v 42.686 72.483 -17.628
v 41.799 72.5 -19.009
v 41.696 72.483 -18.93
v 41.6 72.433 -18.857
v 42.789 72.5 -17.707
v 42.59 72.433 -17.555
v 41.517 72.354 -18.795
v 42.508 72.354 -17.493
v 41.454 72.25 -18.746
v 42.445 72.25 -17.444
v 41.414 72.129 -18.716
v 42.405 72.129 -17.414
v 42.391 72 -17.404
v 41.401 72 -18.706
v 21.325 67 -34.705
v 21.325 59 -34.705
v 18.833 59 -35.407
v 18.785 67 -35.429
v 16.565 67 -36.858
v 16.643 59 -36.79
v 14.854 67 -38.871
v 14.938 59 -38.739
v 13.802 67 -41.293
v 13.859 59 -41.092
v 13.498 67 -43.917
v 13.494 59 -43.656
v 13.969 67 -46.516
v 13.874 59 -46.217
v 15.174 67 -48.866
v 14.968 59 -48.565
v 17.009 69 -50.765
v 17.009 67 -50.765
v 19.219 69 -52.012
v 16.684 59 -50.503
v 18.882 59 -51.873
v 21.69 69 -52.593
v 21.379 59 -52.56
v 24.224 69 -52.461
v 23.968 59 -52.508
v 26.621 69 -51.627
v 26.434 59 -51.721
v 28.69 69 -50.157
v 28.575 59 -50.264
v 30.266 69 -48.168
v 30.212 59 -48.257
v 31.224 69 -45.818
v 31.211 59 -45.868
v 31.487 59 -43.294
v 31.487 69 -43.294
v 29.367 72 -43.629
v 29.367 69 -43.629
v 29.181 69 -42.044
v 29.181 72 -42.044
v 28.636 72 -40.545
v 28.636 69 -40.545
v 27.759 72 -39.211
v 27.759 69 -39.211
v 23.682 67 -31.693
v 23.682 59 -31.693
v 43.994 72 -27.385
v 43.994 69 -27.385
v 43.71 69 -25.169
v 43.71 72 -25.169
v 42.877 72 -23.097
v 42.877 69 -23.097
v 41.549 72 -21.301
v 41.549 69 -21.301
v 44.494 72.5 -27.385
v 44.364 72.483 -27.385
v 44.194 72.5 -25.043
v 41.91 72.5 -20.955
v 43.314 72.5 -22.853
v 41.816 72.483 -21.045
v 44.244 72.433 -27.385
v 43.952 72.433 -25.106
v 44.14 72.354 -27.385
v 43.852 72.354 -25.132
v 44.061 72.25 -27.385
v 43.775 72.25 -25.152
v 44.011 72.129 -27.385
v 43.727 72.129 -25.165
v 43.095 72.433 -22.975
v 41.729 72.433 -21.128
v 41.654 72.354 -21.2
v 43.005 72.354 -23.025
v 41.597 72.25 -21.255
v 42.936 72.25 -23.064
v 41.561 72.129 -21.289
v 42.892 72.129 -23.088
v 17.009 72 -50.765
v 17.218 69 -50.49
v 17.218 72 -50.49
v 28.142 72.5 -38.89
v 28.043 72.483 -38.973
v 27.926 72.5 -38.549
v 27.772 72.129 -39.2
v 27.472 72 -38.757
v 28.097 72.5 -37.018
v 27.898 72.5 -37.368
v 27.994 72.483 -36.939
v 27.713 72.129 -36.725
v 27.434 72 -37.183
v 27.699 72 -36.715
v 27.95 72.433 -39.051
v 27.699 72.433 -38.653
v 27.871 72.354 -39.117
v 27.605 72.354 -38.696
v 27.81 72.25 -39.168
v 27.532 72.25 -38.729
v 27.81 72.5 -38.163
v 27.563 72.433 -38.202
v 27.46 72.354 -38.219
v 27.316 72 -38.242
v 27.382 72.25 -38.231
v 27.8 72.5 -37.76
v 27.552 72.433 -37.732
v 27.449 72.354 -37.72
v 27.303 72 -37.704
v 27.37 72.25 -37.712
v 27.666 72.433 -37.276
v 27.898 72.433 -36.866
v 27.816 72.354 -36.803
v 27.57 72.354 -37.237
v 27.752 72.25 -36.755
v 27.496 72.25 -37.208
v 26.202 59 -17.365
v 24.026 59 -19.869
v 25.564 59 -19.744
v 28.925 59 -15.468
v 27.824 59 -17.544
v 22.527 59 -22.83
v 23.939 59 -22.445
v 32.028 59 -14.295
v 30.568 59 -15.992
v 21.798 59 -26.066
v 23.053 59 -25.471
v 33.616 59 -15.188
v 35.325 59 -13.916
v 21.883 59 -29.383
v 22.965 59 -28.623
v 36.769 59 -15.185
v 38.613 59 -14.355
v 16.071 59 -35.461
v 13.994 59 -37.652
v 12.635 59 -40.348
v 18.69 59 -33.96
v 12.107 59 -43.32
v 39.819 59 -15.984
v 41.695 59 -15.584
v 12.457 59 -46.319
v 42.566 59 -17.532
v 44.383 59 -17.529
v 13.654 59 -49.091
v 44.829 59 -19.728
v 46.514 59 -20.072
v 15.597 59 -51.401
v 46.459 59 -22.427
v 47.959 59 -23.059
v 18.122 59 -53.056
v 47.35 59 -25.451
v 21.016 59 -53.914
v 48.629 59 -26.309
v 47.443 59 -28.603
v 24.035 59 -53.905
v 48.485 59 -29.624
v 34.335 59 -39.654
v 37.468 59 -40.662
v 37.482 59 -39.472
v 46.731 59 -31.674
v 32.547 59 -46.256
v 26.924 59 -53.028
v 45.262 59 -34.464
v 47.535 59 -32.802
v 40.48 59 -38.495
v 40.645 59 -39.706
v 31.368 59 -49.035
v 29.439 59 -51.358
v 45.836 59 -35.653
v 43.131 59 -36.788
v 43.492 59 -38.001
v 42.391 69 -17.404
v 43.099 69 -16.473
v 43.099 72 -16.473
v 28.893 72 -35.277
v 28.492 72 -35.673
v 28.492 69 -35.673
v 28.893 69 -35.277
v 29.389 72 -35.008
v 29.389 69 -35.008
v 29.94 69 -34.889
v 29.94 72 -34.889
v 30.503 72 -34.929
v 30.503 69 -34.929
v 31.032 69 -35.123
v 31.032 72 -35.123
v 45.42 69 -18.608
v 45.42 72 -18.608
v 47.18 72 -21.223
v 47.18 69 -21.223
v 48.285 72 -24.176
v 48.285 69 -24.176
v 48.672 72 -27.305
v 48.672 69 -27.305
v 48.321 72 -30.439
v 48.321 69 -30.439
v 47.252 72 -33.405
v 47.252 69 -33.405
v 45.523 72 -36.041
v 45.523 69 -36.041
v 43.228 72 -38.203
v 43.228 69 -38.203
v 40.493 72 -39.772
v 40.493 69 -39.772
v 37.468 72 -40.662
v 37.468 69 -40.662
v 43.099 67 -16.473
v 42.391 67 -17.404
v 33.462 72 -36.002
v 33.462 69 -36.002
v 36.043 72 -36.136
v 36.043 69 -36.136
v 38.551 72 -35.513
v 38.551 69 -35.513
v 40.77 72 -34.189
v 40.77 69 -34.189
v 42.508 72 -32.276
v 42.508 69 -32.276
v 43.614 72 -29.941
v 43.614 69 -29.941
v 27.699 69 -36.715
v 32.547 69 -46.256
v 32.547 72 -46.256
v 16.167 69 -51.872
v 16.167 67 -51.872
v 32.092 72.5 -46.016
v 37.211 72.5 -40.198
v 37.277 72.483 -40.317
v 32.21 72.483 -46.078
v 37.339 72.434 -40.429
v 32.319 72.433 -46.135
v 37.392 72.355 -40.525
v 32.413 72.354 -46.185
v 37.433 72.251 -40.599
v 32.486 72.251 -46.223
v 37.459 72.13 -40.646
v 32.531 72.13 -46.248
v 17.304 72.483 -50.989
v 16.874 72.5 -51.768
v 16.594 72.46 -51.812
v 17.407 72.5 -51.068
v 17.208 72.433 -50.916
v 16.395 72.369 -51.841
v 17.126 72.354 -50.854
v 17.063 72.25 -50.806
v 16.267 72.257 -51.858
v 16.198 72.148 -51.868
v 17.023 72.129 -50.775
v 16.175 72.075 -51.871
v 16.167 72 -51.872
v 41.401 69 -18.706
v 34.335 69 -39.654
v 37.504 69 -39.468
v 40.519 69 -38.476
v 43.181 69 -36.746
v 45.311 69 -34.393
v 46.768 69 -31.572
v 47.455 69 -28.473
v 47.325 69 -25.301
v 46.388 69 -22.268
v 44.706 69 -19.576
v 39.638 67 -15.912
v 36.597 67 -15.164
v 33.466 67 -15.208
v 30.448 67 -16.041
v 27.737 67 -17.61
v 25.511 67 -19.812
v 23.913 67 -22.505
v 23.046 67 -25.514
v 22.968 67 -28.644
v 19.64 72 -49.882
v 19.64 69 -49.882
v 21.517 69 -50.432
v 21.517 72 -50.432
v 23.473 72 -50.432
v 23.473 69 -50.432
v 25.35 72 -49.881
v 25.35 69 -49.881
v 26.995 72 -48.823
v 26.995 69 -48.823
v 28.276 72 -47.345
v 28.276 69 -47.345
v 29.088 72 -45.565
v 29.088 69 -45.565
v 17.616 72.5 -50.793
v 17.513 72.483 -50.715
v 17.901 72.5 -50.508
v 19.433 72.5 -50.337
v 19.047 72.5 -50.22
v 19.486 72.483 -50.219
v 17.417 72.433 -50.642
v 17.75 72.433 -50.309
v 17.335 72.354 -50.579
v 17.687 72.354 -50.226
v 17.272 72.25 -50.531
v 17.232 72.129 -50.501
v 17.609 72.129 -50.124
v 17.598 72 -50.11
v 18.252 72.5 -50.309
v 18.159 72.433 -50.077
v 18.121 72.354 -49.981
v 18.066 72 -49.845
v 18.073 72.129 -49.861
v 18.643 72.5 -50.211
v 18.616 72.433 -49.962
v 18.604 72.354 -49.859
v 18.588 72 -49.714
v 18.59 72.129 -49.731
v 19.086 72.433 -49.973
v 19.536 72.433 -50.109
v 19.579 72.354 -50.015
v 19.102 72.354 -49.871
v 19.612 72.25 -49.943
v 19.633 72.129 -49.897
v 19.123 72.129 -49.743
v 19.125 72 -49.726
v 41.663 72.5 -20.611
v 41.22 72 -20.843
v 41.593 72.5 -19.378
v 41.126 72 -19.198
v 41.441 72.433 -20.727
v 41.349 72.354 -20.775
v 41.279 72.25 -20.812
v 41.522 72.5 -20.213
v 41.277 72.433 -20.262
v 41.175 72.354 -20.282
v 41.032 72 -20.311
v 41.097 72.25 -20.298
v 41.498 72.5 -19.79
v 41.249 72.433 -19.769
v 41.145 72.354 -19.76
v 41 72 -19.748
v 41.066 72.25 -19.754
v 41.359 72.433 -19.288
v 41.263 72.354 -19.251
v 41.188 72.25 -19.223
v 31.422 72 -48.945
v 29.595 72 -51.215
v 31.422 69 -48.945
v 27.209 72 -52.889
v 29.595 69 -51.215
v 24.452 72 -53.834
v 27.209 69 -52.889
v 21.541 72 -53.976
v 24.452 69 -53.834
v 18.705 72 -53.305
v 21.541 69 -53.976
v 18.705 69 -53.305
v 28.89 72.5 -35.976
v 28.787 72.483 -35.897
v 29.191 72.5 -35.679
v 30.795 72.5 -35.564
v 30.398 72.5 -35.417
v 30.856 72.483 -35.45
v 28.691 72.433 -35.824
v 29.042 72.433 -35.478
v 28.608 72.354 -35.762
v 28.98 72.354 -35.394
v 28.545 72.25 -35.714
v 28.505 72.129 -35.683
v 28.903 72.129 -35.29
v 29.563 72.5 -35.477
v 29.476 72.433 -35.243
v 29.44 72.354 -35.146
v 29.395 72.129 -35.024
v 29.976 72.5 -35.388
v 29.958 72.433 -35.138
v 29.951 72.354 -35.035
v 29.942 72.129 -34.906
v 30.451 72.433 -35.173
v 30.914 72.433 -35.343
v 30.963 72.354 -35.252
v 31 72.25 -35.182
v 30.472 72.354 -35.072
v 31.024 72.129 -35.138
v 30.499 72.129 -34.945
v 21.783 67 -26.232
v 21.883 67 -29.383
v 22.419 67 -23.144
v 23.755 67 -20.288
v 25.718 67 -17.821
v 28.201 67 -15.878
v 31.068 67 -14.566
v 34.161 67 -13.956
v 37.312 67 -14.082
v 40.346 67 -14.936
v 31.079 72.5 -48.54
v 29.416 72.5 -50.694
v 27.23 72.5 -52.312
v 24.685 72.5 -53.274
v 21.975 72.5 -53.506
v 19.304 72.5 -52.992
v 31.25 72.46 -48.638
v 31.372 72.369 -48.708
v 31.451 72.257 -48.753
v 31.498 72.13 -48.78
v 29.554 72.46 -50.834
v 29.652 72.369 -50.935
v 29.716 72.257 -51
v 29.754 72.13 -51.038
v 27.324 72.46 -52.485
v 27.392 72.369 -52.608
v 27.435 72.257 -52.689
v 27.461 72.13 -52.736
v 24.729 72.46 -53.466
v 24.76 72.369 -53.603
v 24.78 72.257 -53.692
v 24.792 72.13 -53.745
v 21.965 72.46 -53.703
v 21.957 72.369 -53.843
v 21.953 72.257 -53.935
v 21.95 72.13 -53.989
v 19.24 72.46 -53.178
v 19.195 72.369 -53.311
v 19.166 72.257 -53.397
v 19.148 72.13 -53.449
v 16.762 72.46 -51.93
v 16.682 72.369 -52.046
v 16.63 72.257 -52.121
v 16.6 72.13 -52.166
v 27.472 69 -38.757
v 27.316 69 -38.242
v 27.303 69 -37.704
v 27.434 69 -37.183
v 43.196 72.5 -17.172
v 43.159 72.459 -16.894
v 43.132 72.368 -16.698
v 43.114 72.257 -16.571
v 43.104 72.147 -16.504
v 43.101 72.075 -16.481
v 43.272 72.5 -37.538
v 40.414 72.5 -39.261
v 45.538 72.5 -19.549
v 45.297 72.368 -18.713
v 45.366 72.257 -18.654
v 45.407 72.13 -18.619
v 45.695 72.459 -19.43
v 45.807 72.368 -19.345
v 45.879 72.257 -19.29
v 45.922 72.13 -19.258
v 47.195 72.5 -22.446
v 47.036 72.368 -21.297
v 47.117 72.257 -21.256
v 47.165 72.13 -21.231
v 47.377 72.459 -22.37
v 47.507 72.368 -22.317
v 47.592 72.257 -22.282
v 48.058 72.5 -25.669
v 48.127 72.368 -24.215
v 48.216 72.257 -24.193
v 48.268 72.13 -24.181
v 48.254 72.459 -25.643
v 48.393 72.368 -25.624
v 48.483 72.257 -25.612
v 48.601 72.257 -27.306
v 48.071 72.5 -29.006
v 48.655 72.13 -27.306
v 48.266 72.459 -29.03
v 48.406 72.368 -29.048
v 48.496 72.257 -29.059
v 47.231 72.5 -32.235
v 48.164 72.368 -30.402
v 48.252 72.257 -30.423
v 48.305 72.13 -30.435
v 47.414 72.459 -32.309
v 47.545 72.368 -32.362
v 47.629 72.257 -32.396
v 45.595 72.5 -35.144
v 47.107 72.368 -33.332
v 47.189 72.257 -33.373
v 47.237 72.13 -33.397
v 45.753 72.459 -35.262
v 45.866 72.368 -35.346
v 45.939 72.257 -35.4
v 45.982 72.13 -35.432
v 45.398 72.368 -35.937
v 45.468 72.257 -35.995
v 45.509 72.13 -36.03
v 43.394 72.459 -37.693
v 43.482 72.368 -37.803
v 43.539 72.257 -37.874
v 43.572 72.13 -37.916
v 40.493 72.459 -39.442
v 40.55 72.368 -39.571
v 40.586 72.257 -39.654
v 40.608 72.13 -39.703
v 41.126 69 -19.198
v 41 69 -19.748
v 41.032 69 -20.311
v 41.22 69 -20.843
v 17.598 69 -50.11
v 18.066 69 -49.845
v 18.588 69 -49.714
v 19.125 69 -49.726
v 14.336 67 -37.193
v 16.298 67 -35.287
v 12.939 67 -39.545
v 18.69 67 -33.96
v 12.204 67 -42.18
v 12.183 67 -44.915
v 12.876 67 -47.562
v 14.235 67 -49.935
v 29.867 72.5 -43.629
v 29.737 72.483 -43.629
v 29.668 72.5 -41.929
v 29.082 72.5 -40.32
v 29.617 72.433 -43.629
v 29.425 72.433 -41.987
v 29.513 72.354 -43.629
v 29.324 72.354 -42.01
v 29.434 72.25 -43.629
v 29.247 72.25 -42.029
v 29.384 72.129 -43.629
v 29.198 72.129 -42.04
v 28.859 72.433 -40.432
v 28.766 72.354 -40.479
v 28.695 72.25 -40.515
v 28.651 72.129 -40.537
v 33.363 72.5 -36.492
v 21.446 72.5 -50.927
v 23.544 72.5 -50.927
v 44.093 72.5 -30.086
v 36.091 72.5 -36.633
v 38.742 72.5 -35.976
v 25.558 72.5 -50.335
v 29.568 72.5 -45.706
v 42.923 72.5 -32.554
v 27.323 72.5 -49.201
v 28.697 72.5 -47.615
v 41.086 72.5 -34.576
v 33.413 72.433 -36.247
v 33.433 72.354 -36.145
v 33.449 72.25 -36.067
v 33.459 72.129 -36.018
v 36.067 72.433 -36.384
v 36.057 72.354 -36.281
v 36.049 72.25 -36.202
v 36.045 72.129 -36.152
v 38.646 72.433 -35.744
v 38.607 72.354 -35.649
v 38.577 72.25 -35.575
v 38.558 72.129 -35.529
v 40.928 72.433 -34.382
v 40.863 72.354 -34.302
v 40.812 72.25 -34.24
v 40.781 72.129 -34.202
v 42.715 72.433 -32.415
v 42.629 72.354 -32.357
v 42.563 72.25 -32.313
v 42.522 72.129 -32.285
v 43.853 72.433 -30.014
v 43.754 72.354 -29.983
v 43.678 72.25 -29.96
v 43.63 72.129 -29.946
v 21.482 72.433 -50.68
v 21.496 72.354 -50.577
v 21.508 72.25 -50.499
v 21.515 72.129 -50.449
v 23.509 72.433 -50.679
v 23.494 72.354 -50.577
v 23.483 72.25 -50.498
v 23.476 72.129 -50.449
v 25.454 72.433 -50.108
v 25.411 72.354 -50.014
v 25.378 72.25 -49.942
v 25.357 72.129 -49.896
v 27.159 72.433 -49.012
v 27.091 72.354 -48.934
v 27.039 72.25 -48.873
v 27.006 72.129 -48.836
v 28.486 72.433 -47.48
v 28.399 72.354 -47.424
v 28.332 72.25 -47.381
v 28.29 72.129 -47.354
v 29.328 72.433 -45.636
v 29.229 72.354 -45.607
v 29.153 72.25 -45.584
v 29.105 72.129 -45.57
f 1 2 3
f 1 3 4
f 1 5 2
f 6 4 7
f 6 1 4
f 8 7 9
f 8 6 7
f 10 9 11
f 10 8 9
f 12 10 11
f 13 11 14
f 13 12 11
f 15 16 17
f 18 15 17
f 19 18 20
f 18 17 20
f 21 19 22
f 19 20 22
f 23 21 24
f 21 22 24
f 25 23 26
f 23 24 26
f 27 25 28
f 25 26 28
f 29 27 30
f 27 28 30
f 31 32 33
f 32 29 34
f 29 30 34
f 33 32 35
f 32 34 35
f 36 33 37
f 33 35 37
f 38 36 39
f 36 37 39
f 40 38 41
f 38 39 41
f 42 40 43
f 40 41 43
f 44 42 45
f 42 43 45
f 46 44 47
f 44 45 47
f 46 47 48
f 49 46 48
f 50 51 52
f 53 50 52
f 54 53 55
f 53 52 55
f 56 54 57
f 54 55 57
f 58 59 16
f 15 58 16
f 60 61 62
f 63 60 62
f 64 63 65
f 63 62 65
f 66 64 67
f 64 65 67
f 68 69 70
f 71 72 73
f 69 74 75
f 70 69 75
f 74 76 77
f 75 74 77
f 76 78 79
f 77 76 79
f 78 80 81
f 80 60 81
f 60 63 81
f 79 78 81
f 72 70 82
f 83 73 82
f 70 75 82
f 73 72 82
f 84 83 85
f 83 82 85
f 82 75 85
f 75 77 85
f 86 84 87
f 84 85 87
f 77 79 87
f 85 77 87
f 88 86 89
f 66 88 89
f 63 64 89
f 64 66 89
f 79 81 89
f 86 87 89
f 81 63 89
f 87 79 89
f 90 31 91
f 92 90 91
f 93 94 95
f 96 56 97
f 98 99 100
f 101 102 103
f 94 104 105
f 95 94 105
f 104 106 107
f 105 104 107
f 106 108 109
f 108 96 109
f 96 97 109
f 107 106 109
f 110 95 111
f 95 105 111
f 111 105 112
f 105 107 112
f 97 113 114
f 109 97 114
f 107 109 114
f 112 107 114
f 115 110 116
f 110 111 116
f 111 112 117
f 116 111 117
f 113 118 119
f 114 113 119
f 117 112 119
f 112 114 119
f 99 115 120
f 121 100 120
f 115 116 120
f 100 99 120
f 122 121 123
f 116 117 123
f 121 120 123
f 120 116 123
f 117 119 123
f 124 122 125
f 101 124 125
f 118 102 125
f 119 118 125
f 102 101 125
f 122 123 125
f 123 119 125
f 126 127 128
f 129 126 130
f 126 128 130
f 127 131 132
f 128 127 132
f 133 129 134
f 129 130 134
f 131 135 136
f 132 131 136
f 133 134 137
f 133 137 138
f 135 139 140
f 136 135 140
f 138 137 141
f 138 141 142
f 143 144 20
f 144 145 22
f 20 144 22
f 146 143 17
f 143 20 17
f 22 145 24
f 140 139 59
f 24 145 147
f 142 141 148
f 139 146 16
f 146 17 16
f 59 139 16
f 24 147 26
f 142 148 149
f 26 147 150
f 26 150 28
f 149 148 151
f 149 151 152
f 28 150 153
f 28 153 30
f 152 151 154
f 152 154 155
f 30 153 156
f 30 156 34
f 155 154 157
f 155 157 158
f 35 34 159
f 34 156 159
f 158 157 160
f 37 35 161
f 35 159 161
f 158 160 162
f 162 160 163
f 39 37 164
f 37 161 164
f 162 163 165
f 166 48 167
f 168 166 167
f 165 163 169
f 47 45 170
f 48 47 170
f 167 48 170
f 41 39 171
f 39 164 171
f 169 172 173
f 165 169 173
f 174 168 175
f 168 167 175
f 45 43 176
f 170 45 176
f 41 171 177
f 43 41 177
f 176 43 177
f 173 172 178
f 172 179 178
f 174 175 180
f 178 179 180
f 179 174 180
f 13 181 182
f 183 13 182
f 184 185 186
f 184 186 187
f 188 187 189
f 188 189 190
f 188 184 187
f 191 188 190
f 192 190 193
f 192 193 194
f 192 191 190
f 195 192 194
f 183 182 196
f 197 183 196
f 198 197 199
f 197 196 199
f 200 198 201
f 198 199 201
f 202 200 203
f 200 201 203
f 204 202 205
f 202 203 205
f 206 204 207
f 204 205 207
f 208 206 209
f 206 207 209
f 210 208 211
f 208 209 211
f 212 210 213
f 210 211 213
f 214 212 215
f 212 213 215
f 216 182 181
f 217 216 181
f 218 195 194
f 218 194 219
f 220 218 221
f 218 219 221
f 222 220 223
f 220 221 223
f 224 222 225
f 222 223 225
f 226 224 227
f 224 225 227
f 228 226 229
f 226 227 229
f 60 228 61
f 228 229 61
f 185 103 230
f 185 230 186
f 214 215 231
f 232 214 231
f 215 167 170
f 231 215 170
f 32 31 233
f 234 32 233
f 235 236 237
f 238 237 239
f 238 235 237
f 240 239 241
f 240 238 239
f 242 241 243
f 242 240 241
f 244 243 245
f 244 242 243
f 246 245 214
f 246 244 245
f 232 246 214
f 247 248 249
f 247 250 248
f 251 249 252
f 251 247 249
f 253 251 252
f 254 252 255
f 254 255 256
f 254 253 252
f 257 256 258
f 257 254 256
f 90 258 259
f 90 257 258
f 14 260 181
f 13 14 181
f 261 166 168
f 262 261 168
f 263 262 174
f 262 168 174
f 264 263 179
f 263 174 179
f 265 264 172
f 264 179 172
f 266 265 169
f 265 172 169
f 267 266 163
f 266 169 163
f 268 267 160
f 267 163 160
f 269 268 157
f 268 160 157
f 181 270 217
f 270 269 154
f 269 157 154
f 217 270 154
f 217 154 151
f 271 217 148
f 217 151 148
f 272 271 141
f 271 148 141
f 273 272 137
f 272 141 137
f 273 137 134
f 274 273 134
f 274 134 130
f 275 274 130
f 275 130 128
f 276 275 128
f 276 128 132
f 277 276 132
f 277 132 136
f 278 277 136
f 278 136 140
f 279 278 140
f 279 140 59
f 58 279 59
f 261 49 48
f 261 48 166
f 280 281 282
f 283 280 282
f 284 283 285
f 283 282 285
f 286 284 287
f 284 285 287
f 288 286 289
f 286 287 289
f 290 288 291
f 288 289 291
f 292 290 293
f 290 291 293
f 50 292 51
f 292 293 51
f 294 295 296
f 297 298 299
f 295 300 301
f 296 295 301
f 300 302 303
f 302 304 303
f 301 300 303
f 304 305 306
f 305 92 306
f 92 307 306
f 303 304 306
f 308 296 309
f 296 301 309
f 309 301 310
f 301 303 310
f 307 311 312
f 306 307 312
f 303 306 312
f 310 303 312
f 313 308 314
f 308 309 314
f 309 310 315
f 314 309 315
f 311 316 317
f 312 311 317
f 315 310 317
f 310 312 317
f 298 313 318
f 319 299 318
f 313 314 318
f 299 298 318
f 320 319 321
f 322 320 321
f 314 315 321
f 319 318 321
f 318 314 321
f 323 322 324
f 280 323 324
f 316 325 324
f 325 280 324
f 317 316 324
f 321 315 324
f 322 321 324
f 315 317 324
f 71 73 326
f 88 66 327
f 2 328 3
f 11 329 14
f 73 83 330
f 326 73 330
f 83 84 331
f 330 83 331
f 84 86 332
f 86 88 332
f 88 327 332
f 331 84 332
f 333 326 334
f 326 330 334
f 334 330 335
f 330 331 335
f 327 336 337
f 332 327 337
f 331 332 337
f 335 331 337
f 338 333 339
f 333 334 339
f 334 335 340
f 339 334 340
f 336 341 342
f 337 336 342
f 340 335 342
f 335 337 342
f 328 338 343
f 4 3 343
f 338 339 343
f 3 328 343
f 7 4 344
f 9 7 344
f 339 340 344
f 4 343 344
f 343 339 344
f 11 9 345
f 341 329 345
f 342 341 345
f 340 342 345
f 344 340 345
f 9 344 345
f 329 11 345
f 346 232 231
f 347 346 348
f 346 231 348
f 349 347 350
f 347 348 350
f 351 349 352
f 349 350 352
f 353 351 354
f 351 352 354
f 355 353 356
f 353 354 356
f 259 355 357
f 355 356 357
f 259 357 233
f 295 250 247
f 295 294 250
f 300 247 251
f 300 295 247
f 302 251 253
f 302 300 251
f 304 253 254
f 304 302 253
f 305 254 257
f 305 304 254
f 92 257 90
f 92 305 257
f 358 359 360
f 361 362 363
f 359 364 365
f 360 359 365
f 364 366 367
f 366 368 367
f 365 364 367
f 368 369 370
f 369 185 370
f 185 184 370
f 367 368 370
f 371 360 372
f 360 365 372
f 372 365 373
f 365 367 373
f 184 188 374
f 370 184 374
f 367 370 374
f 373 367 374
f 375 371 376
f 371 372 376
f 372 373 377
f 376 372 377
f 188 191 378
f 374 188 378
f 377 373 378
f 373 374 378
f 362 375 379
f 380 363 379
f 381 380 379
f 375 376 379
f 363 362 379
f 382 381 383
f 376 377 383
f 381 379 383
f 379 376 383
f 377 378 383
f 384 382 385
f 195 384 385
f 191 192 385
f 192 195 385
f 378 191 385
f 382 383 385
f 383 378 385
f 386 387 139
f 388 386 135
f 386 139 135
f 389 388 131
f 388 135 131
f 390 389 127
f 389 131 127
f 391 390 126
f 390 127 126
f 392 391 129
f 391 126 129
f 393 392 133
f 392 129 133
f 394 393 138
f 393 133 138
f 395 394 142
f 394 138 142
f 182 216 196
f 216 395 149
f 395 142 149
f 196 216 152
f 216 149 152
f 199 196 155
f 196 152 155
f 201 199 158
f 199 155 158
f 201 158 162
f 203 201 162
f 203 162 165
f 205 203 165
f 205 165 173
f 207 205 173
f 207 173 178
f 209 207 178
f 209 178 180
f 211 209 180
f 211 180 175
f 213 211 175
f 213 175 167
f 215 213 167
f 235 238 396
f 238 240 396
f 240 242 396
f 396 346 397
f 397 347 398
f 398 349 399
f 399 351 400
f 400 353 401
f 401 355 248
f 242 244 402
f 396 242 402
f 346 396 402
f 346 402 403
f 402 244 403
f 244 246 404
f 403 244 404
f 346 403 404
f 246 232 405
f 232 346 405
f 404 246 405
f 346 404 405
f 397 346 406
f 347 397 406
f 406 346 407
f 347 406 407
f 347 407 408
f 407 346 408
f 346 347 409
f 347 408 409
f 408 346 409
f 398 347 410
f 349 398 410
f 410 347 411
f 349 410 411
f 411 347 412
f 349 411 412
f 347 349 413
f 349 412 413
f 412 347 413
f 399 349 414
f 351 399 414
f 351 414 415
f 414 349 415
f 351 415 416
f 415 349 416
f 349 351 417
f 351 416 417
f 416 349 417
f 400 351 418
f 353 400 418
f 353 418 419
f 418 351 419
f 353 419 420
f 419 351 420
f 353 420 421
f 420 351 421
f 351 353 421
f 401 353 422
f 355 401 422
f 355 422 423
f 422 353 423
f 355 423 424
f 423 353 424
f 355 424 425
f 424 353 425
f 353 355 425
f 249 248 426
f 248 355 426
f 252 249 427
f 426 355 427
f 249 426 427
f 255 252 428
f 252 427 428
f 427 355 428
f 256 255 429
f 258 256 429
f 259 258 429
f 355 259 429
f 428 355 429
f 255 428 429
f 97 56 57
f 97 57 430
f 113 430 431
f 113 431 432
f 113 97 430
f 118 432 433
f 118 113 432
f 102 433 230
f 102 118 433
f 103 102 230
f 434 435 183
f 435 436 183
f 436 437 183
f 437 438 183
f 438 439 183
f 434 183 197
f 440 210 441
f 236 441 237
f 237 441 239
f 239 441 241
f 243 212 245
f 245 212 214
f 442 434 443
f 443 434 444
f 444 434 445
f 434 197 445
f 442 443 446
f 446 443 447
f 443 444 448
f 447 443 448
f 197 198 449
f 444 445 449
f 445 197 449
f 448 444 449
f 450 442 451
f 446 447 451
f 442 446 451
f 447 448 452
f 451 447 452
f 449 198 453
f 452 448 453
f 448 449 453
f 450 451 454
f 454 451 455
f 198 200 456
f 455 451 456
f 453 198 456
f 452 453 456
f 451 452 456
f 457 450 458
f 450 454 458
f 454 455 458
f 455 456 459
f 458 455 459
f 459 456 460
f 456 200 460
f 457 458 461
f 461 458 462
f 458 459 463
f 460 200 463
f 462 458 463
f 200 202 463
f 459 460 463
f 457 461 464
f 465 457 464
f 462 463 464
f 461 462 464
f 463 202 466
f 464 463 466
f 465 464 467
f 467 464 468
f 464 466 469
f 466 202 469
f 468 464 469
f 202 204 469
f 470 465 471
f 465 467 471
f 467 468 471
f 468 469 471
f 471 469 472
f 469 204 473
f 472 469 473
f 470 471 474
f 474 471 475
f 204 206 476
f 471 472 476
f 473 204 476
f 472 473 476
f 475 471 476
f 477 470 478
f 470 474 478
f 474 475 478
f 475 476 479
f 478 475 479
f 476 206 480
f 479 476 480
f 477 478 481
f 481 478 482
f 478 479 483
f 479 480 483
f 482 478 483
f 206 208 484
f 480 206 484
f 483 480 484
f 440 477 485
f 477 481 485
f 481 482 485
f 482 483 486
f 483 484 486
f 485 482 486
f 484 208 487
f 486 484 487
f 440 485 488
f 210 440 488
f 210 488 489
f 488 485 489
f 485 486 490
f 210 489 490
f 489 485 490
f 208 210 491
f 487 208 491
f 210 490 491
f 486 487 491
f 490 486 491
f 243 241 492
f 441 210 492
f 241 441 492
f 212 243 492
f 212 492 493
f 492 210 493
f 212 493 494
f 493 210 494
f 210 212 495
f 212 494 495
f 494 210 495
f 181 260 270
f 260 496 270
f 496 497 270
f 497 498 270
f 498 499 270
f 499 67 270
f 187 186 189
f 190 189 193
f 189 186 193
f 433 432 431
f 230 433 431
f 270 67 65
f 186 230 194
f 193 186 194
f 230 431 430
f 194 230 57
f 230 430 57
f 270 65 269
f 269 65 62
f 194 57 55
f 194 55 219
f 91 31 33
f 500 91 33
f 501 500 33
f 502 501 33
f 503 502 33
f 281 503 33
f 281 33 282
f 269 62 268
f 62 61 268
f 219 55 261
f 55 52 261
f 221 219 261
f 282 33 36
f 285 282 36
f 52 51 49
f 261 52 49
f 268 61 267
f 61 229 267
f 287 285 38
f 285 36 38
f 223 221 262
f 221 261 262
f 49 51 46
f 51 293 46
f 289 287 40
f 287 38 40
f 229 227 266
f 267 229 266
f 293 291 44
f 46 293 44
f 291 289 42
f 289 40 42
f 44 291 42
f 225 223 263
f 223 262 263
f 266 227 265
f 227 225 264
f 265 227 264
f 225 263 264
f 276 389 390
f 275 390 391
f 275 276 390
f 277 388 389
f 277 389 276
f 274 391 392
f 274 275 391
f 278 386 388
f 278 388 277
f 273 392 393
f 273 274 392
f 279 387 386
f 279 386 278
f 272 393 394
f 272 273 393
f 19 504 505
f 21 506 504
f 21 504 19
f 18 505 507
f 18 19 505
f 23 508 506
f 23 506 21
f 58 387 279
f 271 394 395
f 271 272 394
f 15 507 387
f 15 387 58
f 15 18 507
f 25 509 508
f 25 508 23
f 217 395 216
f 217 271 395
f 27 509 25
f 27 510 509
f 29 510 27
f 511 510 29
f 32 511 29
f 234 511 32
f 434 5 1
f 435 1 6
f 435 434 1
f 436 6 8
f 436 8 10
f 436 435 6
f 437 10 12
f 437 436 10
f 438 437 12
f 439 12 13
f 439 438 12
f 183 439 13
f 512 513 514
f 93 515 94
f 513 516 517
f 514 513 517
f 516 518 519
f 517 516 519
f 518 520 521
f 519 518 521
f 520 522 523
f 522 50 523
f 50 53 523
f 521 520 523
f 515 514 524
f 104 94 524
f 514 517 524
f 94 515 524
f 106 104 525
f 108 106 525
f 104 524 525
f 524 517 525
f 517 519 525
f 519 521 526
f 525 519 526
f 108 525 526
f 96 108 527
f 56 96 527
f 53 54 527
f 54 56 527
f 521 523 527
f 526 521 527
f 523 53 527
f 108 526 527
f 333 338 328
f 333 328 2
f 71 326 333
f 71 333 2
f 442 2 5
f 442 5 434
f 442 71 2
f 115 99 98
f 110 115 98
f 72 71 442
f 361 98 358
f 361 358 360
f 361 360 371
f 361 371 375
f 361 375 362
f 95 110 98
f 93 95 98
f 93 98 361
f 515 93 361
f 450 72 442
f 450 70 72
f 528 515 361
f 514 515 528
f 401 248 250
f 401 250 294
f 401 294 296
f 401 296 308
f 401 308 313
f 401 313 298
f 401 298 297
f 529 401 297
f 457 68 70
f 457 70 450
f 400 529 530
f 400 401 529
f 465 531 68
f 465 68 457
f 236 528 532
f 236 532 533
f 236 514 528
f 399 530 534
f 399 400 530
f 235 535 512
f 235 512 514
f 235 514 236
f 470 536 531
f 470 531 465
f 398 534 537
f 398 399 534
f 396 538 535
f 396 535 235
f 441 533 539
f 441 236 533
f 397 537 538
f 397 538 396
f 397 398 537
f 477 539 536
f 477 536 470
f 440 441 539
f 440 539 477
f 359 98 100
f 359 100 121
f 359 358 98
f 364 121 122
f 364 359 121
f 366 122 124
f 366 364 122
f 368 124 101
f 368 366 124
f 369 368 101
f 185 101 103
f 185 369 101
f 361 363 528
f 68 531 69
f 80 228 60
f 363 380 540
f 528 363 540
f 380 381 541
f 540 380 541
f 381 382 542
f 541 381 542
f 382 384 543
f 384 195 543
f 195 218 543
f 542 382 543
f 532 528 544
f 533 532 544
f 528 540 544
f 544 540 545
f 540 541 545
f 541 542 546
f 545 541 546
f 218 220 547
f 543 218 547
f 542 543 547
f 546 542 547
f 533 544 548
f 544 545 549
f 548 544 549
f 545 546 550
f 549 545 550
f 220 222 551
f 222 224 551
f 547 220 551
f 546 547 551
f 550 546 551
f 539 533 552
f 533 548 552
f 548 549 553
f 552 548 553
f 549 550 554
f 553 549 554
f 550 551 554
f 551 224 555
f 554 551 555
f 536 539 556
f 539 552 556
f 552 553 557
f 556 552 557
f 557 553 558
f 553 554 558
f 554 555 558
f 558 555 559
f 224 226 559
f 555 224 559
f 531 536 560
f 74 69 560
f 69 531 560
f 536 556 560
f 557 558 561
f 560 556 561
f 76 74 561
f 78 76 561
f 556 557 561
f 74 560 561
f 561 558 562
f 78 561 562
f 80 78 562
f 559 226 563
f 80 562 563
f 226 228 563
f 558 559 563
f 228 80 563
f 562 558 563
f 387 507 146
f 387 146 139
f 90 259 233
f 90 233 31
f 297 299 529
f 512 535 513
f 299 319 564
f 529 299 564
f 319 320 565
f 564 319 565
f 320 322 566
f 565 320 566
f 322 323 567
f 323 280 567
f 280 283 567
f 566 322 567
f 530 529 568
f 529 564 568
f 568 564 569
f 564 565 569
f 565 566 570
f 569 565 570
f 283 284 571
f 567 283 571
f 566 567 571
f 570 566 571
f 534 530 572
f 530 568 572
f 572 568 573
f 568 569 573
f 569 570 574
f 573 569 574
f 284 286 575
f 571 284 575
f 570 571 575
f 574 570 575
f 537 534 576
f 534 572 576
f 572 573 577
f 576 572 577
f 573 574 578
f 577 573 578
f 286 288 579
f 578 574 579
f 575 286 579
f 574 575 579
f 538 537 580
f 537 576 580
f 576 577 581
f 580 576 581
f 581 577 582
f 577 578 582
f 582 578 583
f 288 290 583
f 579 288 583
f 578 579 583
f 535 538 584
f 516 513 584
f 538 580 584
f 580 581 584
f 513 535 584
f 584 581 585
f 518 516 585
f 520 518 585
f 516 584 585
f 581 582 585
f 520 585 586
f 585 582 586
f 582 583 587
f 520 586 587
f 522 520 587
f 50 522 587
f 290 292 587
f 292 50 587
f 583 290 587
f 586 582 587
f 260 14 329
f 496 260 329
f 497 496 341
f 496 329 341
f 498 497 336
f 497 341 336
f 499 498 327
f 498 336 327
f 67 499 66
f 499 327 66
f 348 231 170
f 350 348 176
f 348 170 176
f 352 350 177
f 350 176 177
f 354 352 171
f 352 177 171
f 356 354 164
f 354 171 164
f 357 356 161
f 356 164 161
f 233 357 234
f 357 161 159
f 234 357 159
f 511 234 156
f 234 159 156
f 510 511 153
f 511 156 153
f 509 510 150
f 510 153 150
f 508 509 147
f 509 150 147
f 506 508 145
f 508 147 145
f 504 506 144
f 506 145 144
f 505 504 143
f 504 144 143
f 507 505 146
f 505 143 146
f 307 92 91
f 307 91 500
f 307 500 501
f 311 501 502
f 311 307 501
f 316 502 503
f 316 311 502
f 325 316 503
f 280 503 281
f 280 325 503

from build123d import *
from build123d.topology import SkipClean

# Parameters (mm, degrees)
SKETCH1_R                      = 12.3
SKETCH1_R_2                    = 11.45
SKETCH1_R_3                    = 9
SKETCH1_R_4                    = 8.15
BOSS_EXTRUDE4_DEPTH            = 59
SKETCH1_8_R                    = 5
BOSS_EXTRUDE17_DEPTH           = 10
BOSS_EXTRUDE17_DRAFT           = 1
BOSS_EXTRUDE17_PROFILE_2_DEPTH = 10
BOSS_EXTRUDE17_PROFILE_2_DRAFT = 1
BOSS_EXTRUDE19_DEPTH           = 59
SKETCH17_R                     = 11.45
SKETCH17_R_2                   = 8.15
BOSS_EXTRUDE20_DEPTH           = 3
SKETCH19_R                     = 3.2
CUT_EXTRUDE5_DEPTH             = 10
BOSS_EXTRUDE21_DEPTH           = 10
CUT_EXTRUDE8_DEPTH             = 66
CUT_EXTRUDE9_DEPTH             = 2
BOSS_EXTRUDE24_DEPTH           = 3.5
FILLET1_R                      = 2
FILLET2_R                      = 0.5


with BuildPart() as part:
    # Sketch1 → Boss-Extrude4 (new body)
    # profile 1 of 2: a face of its own
    with BuildSketch(Plane(origin=(0, 0, 0), x_dir=(1, 0, 0), z_dir=(0, 1, 0))):
        with Locations((35.202950653, 27.384819692)):
            Circle(SKETCH1_R)
        with Locations(Location((35.202950653, 27.384819692, 0), (0, 0, 270))):
            Circle(SKETCH1_R_2, mode=Mode.SUBTRACT)
    # profile 2 of 2: a face of its own
    with BuildSketch(Plane(origin=(0, 0, 0), x_dir=(1, 0, 0), z_dir=(0, 1, 0))):
        with Locations((22.493671705, 43.629178782)):
            Circle(SKETCH1_R_3)
        with Locations(Location((22.493671705, 43.629178782, 0), (0, 0, 270))):
            Circle(SKETCH1_R_4, mode=Mode.SUBTRACT)
    extrude(amount=BOSS_EXTRUDE4_DEPTH)

    # Sketch12 → Boss-Extrude19 (add)
    with SkipClean():  # the faces are left unmerged after this step: merging them gives an invalid solid
        with BuildSketch(Plane(origin=(0, 0, 0), x_dir=(-1, 0, 0), z_dir=(0, -1, 0))):
            with BuildLine():
                Line((-34.977539895, 38.8326007), (-30.605091655, 44.421243424))
                ThreePointArc((-30.605091655, 44.421243424), (-27.821958355, 37.462181021), (-20.532623065, 35.718629608))
                Line((-20.532623065, 35.718629608), (-24.304935413, 30.897050301))
                ThreePointArc((-24.304935413, 30.897050301), (-28.370974986, 36.573215009), (-34.977539895, 38.8326007))
            make_face()
        extrude(amount=-BOSS_EXTRUDE19_DEPTH)



with BuildPart() as body_2:
    # Sketch1<8> → Boss-Extrude17 (with draft: the straight prism first)
    with BuildSketch(Plane(origin=(0, 0, 0), x_dir=(1, 0, 0), z_dir=(0, 1, 0))):
        with Locations((22.493671705, 43.629178782)):
            Circle(SKETCH1_8_R)
    extrude(amount=BOSS_EXTRUDE17_DEPTH)
    # Boss-Extrude17: the draft: its side faces are tilted about the plane it starts from
    boss_extrude17_sides = [body_2.faces().sort_by_distance(p)[0] for p in [
        (17.493671705, 5, -43.629178782),
    ]]
    draft(boss_extrude17_sides, Plane(origin=(0, 0, 0), x_dir=(1, 0, 0), z_dir=(0, 1, 0)), BOSS_EXTRUDE17_DRAFT)


with BuildPart() as body_3:
    # Sketch1<8> → Boss-Extrude17 profile 2 (with draft: the straight prism first)
    with BuildSketch(Plane(origin=(0, 0, 0), x_dir=(1, 0, 0), z_dir=(0, 1, 0))):
        with Locations((35.202950653, 27.384819692)):
            Circle(SKETCH1_8_R)
    extrude(amount=BOSS_EXTRUDE17_PROFILE_2_DEPTH)
    # Boss-Extrude17 profile 2: the draft: its side faces are tilted about the plane it starts from
    boss_extrude17_profile_2_sides = [body_3.faces().sort_by_distance(p)[0] for p in [
        (30.202950653, 5, -27.384819692),
    ]]
    draft(boss_extrude17_profile_2_sides, Plane(origin=(0, 0, 0), x_dir=(1, 0, 0), z_dir=(0, 1, 0)), BOSS_EXTRUDE17_PROFILE_2_DRAFT)


with BuildPart() as part_1:
    with SkipClean():  # the faces are left unmerged after this step: merging them gives an invalid solid
        add(part.part)

        add(body_2.part)  # Boss-Extrude20 merges body 2

        add(body_3.part)  # Boss-Extrude20 merges body 3
        # Sketch17 → Boss-Extrude20 (add)
        with BuildSketch(Plane.XZ):
            with Locations(Location((35.202950653, -27.384819692, 0), (0, 0, 270))):
                Circle(SKETCH17_R)
            with Locations(Location((22.493671705, -43.629178782, 0), (0, 0, 270))):
                Circle(SKETCH17_R_2)
        extrude(amount=-BOSS_EXTRUDE20_DEPTH)

    # Sketch19 → Cut-Extrude5 (cut)
    with SkipClean():  # the faces are left unmerged after this step: merging them gives an invalid solid
        with BuildSketch(Plane(origin=(0, 0, 0), x_dir=(-1, 0, 0), z_dir=(0, -1, 0))):
            with Locations(Location((-35.202950653, 27.384819692, 0), (0, 0, 90))):
                Circle(SKETCH19_R)
            with Locations(Location((-22.493671705, 43.629178782, 0), (0, 0, 90))):
                Circle(SKETCH19_R)
        extrude(amount=-CUT_EXTRUDE5_DEPTH, mode=Mode.SUBTRACT)

    # Sketch35 → Cut-Extrude8 (cut)
    with BuildSketch(Plane.XZ):
        with BuildLine():
            Line((21.325413706, -34.705324611), (23.682144413, -31.693070334))
            ThreePointArc((23.682144413, -31.693070334), (42.566125739, -17.532223454), (34.334781161, -39.654142483))
            Line((34.334781161, -39.654142483), (31.487409842, -43.293508835))
            ThreePointArc((31.487409842, -43.293508835), (16.684303244, -50.503132381), (21.325413706, -34.705324611))
        make_face()
    extrude(amount=-CUT_EXTRUDE8_DEPTH, mode=Mode.SUBTRACT)


with BuildPart() as body_2_2:
    # Sketch23 → Boss-Extrude21 (new body)
    with BuildSketch(Plane(origin=(0, 59, 0), x_dir=(1, 0, 0), z_dir=(0, 1, 0))):
        with BuildLine():
            Line((37.468337272, 40.662183298), (32.546981676, 46.25595936))
            ThreePointArc((32.546981676, 46.25595936), (15.596937819, 51.401184911), (18.690039782, 33.959566495))
            Line((18.690039782, 33.959566495), (21.882803933, 29.3833322))
            ThreePointArc((21.882803933, 29.3833322), (43.099472085, 16.473114504), (37.468337272, 40.662183298))
        make_face()
        with BuildLine():
            ThreePointArc((21.325413706, 34.705324611), (16.684303244, 50.503132381), (31.487409842, 43.293508835))
            Line((31.487409842, 43.293508835), (34.334781161, 39.654142483))
            ThreePointArc((34.334781161, 39.654142483), (42.566125739, 17.532223454), (23.682144413, 31.693070334))
            Line((23.682144413, 31.693070334), (21.325413706, 34.705324611))
        make_face(mode=Mode.SUBTRACT)
    extrude(amount=BOSS_EXTRUDE21_DEPTH)

    # Sketch36 → Cut-Extrude9 (cut)
    with BuildSketch(Plane(origin=(0, 69, 0), x_dir=(1, 0, 0), z_dir=(0, 1, 0))):
        with BuildLine():
            Line((43.099472085, 16.473114504), (16.167051125, 51.87192648))
            ThreePointArc((16.167051125, 51.87192648), (12.204421781, 42.179919116), (18.690039782, 33.959566495))
            Line((18.690039782, 33.959566495), (21.882803933, 29.3833322))
            ThreePointArc((21.882803933, 29.3833322), (28.201353831, 15.878386587), (43.099472085, 16.473114504))
        make_face()
    extrude(amount=-CUT_EXTRUDE9_DEPTH, mode=Mode.SUBTRACT)

    # Sketch37 → Boss-Extrude24 (add)
    with BuildSketch(Plane(origin=(0, 69, 0), x_dir=(1, 0, 0), z_dir=(0, 1, 0))):
        with BuildLine():
            ThreePointArc((34.334781161, 39.654142483), (46.768156488, 31.572422107), (42.391274941, 17.403938272))
            Line((42.391274941, 17.403938272), (43.099472085, 16.473114504))
            ThreePointArc((43.099472085, 16.473114504), (48.321405443, 30.438752363), (37.468337272, 40.662183298))
            Line((37.468337272, 40.662183298), (32.546981676, 46.25595936))
            ThreePointArc((32.546981676, 46.25595936), (25.863660596, 53.45832892), (16.167051125, 51.87192648))
            Line((16.167051125, 51.87192648), (17.009199279, 50.765043285))
            ThreePointArc((17.009199279, 50.765043285), (26.620982357, 51.627010161), (31.487409842, 43.293508835))
            Line((31.487409842, 43.293508835), (34.334781161, 39.654142483))
        make_face()
        with BuildLine():
            Line((40.265515658, 20.197944547), (42.391274941, 17.403938272))
            ThreePointArc((42.391274941, 17.403938272), (46.768156488, 31.572422107), (34.334781161, 39.654142483))
            Line((34.334781161, 39.654142483), (31.487409842, 43.293508835))
            ThreePointArc((31.487409842, 43.293508835), (26.620982357, 51.627010161), (17.009199279, 50.765043285))
            Line((17.009199279, 50.765043285), (18.297152058, 49.072213728))
            ThreePointArc((18.297152058, 49.072213728), (25.526405421, 49.79683091), (29.366619149, 43.629178782))
            ThreePointArc((29.366619149, 43.629178782), (28.641776112, 40.557010367), (26.620135535, 38.132843382))
            Line((26.620135535, 38.132843382), (29.626833273, 34.180969615))
            ThreePointArc((29.626833273, 34.180969615), (38.962032304, 35.331519884), (43.993897063, 27.384819692))
            ThreePointArc((43.993897063, 27.384819692), (43.006330576, 23.336610142), (40.265515658, 20.197944547))
        make_face()
    extrude(amount=BOSS_EXTRUDE24_DEPTH)

    # Fillet1
    fillet1_edges = [body_2_2.edges().sort_by_distance(p)[0] for p in [
        (29.626833273, 70.75, -34.180969615),
        (40.265515658, 70.75, -20.197944547),
        (18.297152058, 70.75, -49.072213728),
        (26.620135535, 70.75, -38.132843382),
    ]]
    fillet(fillet1_edges, radius=FILLET1_R)

    # Fillet2
    fillet2_edges = [body_2_2.edges().sort_by_distance(p)[0] for p in [
        (42.199176887, 72.5, -32.707747202),
        (27.963469036, 72.5, -47.790755853),
        (28.095359601, 72.5, -36.193872526),
        (18.322601236, 72.5, -49.761580581),
        (27.291314439, 72.5, -37.973490947),
        (29.660488695, 72.5, -34.92920458),
        (40.995618754, 72.5, -20.030798741),
        (48.321405443, 72.5, -30.438752363),
        (35.007659474, 72.5, -43.459071329),
        (25.863660596, 72.5, -53.45832892),
        (16.692641456, 72.5, -51.181113228),
        (42.25007881, 72.5, -17.589520374),
    ]]
    fillet(fillet2_edges, radius=FILLET2_R)


solid = body_2_2.part
